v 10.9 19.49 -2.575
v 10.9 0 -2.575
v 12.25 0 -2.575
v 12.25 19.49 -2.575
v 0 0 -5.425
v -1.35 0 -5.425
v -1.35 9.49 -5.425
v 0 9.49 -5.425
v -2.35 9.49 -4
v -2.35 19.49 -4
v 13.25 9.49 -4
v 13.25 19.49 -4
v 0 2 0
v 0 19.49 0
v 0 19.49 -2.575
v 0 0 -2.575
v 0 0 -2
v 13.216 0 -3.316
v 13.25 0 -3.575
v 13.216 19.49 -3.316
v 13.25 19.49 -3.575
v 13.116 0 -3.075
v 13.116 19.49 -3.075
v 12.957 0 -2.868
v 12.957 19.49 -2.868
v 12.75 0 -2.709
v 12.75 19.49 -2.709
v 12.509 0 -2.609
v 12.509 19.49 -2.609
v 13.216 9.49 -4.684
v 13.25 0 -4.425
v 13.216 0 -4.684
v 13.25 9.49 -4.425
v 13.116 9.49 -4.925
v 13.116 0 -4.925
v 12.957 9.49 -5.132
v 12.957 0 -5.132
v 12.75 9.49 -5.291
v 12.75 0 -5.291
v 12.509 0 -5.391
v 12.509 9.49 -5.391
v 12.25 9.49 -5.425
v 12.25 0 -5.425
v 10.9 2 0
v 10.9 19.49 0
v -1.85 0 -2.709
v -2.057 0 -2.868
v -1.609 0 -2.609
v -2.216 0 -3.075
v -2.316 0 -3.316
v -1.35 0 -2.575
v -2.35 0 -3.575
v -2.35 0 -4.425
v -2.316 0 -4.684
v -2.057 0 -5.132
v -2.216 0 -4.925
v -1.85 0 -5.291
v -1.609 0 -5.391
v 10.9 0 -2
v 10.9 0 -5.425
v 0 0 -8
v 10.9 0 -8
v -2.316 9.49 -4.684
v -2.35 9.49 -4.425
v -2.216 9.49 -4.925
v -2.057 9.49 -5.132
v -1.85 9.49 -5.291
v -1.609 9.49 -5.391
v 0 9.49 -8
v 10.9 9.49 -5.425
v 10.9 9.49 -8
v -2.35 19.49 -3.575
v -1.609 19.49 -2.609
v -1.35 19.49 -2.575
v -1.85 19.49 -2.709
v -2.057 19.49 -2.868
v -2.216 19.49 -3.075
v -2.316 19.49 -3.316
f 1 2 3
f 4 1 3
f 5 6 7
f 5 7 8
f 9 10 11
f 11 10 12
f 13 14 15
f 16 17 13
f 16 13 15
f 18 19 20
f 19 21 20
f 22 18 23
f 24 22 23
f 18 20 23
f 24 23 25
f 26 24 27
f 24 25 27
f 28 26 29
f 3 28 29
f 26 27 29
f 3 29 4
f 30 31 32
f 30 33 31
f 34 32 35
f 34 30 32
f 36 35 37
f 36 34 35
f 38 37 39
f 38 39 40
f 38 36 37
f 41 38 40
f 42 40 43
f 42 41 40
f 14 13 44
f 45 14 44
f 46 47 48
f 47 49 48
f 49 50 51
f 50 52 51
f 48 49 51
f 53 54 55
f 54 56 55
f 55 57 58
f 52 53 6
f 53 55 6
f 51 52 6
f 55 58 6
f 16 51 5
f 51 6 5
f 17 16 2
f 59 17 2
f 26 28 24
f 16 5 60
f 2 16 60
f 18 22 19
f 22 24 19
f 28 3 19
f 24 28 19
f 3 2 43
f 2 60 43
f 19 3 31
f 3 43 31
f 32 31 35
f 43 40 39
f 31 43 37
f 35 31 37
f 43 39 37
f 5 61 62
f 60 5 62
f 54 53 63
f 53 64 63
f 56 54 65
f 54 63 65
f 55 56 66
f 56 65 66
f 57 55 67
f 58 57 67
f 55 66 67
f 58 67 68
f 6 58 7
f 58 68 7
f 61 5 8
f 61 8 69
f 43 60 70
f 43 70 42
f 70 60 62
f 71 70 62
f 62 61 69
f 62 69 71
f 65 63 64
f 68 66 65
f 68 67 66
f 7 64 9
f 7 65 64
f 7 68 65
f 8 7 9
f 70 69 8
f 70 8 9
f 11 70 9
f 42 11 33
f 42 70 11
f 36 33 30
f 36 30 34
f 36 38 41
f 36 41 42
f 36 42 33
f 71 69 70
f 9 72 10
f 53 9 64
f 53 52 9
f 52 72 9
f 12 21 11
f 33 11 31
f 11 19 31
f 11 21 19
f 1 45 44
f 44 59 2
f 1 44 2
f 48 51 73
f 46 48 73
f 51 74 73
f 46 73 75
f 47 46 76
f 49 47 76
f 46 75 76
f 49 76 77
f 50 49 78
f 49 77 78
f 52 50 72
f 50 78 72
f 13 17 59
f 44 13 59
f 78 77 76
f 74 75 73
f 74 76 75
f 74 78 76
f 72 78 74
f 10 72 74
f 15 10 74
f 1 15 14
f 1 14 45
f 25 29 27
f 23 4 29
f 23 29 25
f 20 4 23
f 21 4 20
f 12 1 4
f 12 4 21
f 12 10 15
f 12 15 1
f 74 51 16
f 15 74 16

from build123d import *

# Parameters (mm, degrees)
ESQUISSE1_W             = 10.9
ESQUISSE1_H             = 8
ESQUISSE1_W_2           = 2.35
ESQUISSE1_H_2           = 2.85
BOSS_EXTRU_1_DEPTH      = 19.49
CHANFREIN1_SIZE         = 2
ESQUISSE2_W             = 15.6
ESQUISSE2_H             = 4
ENL_V_MAT_EXTRU_1_DEPTH = 10
CONG_1_R                = 1


with BuildPart() as part:
    # Esquisse1 → Boss.-Extru.1 (new body)
    with BuildSketch(Plane(origin=(0, 0, 0), x_dir=(1, 0, 0), z_dir=(0, 1, 0))):
        with Locations((5.45, 4)):
            Rectangle(ESQUISSE1_W, ESQUISSE1_H)
        with Locations((-1.175, 4)):
            Rectangle(ESQUISSE1_W_2, ESQUISSE1_H_2)
        with Locations((12.075, 4)):
            Rectangle(ESQUISSE1_W_2, ESQUISSE1_H_2)
    extrude(amount=BOSS_EXTRU_1_DEPTH)

    # Chanfrein1
    chanfrein1_edges = [part.edges().sort_by_distance(p)[0] for p in [
        (5.45, 0, 0),
    ]]
    chamfer(chanfrein1_edges, length=CHANFREIN1_SIZE)

    # Esquisse2 → Enlèv. mat.-Extru.1 (cut)
    with BuildSketch(Plane(origin=(0, 19.49, 0), x_dir=(1, 0, 0), z_dir=(0, 1, 0))):
        with Locations((5.45, 6)):
            Rectangle(ESQUISSE2_W, ESQUISSE2_H)
    extrude(amount=-ENL_V_MAT_EXTRU_1_DEPTH, mode=Mode.SUBTRACT)

    # Congé1
    cong_1_edges = [part.edges().sort_by_distance(p)[0] for p in [
        (-2.35, 9.745, -2.575),
        (13.25, 9.745, -2.575),
        (-2.35, 4.745, -5.425),
        (13.25, 4.745, -5.425),
    ]]
    fillet(cong_1_edges, radius=CONG_1_R)


solid = part.part
